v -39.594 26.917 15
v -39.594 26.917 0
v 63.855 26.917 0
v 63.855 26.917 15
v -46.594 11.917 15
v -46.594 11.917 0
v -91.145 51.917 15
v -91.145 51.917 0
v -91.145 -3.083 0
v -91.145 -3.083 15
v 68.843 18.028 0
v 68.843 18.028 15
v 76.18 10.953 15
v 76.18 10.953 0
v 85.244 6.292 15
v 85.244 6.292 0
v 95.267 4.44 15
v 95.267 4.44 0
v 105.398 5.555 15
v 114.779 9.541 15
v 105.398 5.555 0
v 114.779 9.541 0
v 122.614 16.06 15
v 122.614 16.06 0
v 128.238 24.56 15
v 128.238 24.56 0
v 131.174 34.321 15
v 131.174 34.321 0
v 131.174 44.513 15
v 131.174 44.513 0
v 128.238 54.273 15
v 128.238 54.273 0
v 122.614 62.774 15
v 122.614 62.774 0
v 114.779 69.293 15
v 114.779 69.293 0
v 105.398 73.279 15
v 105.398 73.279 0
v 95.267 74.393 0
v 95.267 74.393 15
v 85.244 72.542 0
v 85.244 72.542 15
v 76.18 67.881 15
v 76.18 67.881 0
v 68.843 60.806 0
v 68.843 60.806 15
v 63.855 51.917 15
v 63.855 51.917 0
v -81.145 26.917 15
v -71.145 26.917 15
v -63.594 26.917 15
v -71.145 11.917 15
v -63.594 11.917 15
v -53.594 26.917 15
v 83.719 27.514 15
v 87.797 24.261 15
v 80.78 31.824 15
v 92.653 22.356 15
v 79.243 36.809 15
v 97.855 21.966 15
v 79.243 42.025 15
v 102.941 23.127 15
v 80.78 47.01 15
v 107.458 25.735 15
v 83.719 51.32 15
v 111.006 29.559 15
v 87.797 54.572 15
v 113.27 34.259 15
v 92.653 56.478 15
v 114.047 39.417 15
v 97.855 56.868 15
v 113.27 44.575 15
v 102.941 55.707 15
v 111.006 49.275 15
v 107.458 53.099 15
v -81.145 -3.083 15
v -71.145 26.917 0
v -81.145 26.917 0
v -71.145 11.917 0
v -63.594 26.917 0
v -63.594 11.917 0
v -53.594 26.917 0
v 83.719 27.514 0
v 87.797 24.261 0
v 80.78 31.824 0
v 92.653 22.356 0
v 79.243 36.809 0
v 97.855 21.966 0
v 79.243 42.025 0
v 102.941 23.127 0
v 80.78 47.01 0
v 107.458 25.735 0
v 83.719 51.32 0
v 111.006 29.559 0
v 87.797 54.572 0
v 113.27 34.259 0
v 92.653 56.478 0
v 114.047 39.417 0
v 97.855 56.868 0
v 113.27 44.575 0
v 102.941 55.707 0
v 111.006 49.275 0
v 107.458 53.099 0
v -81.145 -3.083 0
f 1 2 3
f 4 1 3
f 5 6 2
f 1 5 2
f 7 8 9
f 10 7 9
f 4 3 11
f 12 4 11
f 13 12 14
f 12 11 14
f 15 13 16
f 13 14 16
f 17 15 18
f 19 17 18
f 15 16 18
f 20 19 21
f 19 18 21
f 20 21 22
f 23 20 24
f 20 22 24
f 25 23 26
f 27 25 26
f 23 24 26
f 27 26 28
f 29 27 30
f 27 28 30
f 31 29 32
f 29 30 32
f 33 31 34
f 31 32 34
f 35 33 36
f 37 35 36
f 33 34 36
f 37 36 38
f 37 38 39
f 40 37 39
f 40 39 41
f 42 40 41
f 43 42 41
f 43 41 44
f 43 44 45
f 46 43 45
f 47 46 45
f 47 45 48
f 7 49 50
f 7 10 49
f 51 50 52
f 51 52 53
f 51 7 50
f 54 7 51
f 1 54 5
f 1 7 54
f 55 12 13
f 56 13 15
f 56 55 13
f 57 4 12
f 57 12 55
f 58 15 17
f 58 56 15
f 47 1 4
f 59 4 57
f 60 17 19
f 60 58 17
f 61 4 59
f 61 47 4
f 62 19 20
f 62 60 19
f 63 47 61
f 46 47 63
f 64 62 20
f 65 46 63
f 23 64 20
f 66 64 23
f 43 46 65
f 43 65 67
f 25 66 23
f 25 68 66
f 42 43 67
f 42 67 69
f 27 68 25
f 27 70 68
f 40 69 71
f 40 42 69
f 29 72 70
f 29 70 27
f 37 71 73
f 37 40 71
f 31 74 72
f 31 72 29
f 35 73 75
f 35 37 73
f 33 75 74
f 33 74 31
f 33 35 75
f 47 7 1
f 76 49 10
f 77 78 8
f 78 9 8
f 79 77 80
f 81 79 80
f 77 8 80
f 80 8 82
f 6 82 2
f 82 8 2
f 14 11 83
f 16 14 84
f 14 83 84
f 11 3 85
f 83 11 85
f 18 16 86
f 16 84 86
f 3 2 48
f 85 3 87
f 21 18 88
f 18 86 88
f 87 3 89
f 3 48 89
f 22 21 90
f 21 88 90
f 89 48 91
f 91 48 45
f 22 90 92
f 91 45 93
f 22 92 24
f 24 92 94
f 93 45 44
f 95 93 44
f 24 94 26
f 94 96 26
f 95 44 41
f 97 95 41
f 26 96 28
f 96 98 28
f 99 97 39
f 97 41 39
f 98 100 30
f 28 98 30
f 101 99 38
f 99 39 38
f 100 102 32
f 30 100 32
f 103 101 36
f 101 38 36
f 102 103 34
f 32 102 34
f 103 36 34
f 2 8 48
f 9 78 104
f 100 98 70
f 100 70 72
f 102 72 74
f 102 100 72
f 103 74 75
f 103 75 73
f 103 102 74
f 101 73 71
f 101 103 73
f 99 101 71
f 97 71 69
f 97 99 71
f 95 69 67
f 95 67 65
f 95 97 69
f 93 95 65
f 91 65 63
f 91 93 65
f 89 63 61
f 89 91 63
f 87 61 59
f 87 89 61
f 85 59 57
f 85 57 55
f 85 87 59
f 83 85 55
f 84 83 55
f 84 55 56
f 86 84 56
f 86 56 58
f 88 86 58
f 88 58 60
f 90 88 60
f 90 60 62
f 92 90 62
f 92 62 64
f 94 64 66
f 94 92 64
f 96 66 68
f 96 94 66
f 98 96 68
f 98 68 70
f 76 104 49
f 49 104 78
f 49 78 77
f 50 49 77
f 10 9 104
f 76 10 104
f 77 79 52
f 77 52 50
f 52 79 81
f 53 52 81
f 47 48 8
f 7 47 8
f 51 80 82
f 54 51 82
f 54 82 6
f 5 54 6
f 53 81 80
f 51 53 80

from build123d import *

# Parameters (mm, degrees)
F0_W     = 7.5505197141
F0_H     = 15
F0_W_2   = 10
F0_H_2   = 30
F0_R     = 17.5
F1_DEPTH = 15


# Not quite as in the source:
# - a feature of the source that left no trace in its solid (it failed there, or was rolled back) is left out


with BuildPart() as f1:
    # F0 (on Top) → F1 (new body)
    with BuildSketch(Plane.XY):
        Polygon((63.855322471, 51.9168977576), (-91.144677529, 51.9168977576), (-91.144677529, 26.9168977576), (-81.144677529, 26.9168977576), (-71.144677529, 26.9168977576), (-63.594157815, 26.9168977576), (-53.594157815, 26.9168977576), (-46.594157815, 26.9168977576), (-39.594157815, 26.9168977576), (63.855322471, 26.9168977576), align=None)
        Polygon((-46.594157815, 11.9168977576), (-39.594157815, 26.9168977576), (-46.594157815, 26.9168977576), (-53.594157815, 26.9168977576), align=None)
        with Locations((-67.369417672, 19.4168977576)):
            Rectangle(F0_W, F0_H)
        with Locations((-86.144677529, 11.9168977576)):
            Rectangle(F0_W_2, F0_H_2)
        with BuildLine():
            ThreePointArc((63.855322471, 26.9168977576), (131.5470645475, 39.4168977576), (63.855322471, 51.9168977576))
            Line((63.855322471, 51.9168977576), (63.855322471, 26.9168977576))
        make_face()
        with Locations((96.5470645475, 39.4168977576)):
            Circle(F0_R, mode=Mode.SUBTRACT)
    extrude(amount=F1_DEPTH)


solid = f1.part
